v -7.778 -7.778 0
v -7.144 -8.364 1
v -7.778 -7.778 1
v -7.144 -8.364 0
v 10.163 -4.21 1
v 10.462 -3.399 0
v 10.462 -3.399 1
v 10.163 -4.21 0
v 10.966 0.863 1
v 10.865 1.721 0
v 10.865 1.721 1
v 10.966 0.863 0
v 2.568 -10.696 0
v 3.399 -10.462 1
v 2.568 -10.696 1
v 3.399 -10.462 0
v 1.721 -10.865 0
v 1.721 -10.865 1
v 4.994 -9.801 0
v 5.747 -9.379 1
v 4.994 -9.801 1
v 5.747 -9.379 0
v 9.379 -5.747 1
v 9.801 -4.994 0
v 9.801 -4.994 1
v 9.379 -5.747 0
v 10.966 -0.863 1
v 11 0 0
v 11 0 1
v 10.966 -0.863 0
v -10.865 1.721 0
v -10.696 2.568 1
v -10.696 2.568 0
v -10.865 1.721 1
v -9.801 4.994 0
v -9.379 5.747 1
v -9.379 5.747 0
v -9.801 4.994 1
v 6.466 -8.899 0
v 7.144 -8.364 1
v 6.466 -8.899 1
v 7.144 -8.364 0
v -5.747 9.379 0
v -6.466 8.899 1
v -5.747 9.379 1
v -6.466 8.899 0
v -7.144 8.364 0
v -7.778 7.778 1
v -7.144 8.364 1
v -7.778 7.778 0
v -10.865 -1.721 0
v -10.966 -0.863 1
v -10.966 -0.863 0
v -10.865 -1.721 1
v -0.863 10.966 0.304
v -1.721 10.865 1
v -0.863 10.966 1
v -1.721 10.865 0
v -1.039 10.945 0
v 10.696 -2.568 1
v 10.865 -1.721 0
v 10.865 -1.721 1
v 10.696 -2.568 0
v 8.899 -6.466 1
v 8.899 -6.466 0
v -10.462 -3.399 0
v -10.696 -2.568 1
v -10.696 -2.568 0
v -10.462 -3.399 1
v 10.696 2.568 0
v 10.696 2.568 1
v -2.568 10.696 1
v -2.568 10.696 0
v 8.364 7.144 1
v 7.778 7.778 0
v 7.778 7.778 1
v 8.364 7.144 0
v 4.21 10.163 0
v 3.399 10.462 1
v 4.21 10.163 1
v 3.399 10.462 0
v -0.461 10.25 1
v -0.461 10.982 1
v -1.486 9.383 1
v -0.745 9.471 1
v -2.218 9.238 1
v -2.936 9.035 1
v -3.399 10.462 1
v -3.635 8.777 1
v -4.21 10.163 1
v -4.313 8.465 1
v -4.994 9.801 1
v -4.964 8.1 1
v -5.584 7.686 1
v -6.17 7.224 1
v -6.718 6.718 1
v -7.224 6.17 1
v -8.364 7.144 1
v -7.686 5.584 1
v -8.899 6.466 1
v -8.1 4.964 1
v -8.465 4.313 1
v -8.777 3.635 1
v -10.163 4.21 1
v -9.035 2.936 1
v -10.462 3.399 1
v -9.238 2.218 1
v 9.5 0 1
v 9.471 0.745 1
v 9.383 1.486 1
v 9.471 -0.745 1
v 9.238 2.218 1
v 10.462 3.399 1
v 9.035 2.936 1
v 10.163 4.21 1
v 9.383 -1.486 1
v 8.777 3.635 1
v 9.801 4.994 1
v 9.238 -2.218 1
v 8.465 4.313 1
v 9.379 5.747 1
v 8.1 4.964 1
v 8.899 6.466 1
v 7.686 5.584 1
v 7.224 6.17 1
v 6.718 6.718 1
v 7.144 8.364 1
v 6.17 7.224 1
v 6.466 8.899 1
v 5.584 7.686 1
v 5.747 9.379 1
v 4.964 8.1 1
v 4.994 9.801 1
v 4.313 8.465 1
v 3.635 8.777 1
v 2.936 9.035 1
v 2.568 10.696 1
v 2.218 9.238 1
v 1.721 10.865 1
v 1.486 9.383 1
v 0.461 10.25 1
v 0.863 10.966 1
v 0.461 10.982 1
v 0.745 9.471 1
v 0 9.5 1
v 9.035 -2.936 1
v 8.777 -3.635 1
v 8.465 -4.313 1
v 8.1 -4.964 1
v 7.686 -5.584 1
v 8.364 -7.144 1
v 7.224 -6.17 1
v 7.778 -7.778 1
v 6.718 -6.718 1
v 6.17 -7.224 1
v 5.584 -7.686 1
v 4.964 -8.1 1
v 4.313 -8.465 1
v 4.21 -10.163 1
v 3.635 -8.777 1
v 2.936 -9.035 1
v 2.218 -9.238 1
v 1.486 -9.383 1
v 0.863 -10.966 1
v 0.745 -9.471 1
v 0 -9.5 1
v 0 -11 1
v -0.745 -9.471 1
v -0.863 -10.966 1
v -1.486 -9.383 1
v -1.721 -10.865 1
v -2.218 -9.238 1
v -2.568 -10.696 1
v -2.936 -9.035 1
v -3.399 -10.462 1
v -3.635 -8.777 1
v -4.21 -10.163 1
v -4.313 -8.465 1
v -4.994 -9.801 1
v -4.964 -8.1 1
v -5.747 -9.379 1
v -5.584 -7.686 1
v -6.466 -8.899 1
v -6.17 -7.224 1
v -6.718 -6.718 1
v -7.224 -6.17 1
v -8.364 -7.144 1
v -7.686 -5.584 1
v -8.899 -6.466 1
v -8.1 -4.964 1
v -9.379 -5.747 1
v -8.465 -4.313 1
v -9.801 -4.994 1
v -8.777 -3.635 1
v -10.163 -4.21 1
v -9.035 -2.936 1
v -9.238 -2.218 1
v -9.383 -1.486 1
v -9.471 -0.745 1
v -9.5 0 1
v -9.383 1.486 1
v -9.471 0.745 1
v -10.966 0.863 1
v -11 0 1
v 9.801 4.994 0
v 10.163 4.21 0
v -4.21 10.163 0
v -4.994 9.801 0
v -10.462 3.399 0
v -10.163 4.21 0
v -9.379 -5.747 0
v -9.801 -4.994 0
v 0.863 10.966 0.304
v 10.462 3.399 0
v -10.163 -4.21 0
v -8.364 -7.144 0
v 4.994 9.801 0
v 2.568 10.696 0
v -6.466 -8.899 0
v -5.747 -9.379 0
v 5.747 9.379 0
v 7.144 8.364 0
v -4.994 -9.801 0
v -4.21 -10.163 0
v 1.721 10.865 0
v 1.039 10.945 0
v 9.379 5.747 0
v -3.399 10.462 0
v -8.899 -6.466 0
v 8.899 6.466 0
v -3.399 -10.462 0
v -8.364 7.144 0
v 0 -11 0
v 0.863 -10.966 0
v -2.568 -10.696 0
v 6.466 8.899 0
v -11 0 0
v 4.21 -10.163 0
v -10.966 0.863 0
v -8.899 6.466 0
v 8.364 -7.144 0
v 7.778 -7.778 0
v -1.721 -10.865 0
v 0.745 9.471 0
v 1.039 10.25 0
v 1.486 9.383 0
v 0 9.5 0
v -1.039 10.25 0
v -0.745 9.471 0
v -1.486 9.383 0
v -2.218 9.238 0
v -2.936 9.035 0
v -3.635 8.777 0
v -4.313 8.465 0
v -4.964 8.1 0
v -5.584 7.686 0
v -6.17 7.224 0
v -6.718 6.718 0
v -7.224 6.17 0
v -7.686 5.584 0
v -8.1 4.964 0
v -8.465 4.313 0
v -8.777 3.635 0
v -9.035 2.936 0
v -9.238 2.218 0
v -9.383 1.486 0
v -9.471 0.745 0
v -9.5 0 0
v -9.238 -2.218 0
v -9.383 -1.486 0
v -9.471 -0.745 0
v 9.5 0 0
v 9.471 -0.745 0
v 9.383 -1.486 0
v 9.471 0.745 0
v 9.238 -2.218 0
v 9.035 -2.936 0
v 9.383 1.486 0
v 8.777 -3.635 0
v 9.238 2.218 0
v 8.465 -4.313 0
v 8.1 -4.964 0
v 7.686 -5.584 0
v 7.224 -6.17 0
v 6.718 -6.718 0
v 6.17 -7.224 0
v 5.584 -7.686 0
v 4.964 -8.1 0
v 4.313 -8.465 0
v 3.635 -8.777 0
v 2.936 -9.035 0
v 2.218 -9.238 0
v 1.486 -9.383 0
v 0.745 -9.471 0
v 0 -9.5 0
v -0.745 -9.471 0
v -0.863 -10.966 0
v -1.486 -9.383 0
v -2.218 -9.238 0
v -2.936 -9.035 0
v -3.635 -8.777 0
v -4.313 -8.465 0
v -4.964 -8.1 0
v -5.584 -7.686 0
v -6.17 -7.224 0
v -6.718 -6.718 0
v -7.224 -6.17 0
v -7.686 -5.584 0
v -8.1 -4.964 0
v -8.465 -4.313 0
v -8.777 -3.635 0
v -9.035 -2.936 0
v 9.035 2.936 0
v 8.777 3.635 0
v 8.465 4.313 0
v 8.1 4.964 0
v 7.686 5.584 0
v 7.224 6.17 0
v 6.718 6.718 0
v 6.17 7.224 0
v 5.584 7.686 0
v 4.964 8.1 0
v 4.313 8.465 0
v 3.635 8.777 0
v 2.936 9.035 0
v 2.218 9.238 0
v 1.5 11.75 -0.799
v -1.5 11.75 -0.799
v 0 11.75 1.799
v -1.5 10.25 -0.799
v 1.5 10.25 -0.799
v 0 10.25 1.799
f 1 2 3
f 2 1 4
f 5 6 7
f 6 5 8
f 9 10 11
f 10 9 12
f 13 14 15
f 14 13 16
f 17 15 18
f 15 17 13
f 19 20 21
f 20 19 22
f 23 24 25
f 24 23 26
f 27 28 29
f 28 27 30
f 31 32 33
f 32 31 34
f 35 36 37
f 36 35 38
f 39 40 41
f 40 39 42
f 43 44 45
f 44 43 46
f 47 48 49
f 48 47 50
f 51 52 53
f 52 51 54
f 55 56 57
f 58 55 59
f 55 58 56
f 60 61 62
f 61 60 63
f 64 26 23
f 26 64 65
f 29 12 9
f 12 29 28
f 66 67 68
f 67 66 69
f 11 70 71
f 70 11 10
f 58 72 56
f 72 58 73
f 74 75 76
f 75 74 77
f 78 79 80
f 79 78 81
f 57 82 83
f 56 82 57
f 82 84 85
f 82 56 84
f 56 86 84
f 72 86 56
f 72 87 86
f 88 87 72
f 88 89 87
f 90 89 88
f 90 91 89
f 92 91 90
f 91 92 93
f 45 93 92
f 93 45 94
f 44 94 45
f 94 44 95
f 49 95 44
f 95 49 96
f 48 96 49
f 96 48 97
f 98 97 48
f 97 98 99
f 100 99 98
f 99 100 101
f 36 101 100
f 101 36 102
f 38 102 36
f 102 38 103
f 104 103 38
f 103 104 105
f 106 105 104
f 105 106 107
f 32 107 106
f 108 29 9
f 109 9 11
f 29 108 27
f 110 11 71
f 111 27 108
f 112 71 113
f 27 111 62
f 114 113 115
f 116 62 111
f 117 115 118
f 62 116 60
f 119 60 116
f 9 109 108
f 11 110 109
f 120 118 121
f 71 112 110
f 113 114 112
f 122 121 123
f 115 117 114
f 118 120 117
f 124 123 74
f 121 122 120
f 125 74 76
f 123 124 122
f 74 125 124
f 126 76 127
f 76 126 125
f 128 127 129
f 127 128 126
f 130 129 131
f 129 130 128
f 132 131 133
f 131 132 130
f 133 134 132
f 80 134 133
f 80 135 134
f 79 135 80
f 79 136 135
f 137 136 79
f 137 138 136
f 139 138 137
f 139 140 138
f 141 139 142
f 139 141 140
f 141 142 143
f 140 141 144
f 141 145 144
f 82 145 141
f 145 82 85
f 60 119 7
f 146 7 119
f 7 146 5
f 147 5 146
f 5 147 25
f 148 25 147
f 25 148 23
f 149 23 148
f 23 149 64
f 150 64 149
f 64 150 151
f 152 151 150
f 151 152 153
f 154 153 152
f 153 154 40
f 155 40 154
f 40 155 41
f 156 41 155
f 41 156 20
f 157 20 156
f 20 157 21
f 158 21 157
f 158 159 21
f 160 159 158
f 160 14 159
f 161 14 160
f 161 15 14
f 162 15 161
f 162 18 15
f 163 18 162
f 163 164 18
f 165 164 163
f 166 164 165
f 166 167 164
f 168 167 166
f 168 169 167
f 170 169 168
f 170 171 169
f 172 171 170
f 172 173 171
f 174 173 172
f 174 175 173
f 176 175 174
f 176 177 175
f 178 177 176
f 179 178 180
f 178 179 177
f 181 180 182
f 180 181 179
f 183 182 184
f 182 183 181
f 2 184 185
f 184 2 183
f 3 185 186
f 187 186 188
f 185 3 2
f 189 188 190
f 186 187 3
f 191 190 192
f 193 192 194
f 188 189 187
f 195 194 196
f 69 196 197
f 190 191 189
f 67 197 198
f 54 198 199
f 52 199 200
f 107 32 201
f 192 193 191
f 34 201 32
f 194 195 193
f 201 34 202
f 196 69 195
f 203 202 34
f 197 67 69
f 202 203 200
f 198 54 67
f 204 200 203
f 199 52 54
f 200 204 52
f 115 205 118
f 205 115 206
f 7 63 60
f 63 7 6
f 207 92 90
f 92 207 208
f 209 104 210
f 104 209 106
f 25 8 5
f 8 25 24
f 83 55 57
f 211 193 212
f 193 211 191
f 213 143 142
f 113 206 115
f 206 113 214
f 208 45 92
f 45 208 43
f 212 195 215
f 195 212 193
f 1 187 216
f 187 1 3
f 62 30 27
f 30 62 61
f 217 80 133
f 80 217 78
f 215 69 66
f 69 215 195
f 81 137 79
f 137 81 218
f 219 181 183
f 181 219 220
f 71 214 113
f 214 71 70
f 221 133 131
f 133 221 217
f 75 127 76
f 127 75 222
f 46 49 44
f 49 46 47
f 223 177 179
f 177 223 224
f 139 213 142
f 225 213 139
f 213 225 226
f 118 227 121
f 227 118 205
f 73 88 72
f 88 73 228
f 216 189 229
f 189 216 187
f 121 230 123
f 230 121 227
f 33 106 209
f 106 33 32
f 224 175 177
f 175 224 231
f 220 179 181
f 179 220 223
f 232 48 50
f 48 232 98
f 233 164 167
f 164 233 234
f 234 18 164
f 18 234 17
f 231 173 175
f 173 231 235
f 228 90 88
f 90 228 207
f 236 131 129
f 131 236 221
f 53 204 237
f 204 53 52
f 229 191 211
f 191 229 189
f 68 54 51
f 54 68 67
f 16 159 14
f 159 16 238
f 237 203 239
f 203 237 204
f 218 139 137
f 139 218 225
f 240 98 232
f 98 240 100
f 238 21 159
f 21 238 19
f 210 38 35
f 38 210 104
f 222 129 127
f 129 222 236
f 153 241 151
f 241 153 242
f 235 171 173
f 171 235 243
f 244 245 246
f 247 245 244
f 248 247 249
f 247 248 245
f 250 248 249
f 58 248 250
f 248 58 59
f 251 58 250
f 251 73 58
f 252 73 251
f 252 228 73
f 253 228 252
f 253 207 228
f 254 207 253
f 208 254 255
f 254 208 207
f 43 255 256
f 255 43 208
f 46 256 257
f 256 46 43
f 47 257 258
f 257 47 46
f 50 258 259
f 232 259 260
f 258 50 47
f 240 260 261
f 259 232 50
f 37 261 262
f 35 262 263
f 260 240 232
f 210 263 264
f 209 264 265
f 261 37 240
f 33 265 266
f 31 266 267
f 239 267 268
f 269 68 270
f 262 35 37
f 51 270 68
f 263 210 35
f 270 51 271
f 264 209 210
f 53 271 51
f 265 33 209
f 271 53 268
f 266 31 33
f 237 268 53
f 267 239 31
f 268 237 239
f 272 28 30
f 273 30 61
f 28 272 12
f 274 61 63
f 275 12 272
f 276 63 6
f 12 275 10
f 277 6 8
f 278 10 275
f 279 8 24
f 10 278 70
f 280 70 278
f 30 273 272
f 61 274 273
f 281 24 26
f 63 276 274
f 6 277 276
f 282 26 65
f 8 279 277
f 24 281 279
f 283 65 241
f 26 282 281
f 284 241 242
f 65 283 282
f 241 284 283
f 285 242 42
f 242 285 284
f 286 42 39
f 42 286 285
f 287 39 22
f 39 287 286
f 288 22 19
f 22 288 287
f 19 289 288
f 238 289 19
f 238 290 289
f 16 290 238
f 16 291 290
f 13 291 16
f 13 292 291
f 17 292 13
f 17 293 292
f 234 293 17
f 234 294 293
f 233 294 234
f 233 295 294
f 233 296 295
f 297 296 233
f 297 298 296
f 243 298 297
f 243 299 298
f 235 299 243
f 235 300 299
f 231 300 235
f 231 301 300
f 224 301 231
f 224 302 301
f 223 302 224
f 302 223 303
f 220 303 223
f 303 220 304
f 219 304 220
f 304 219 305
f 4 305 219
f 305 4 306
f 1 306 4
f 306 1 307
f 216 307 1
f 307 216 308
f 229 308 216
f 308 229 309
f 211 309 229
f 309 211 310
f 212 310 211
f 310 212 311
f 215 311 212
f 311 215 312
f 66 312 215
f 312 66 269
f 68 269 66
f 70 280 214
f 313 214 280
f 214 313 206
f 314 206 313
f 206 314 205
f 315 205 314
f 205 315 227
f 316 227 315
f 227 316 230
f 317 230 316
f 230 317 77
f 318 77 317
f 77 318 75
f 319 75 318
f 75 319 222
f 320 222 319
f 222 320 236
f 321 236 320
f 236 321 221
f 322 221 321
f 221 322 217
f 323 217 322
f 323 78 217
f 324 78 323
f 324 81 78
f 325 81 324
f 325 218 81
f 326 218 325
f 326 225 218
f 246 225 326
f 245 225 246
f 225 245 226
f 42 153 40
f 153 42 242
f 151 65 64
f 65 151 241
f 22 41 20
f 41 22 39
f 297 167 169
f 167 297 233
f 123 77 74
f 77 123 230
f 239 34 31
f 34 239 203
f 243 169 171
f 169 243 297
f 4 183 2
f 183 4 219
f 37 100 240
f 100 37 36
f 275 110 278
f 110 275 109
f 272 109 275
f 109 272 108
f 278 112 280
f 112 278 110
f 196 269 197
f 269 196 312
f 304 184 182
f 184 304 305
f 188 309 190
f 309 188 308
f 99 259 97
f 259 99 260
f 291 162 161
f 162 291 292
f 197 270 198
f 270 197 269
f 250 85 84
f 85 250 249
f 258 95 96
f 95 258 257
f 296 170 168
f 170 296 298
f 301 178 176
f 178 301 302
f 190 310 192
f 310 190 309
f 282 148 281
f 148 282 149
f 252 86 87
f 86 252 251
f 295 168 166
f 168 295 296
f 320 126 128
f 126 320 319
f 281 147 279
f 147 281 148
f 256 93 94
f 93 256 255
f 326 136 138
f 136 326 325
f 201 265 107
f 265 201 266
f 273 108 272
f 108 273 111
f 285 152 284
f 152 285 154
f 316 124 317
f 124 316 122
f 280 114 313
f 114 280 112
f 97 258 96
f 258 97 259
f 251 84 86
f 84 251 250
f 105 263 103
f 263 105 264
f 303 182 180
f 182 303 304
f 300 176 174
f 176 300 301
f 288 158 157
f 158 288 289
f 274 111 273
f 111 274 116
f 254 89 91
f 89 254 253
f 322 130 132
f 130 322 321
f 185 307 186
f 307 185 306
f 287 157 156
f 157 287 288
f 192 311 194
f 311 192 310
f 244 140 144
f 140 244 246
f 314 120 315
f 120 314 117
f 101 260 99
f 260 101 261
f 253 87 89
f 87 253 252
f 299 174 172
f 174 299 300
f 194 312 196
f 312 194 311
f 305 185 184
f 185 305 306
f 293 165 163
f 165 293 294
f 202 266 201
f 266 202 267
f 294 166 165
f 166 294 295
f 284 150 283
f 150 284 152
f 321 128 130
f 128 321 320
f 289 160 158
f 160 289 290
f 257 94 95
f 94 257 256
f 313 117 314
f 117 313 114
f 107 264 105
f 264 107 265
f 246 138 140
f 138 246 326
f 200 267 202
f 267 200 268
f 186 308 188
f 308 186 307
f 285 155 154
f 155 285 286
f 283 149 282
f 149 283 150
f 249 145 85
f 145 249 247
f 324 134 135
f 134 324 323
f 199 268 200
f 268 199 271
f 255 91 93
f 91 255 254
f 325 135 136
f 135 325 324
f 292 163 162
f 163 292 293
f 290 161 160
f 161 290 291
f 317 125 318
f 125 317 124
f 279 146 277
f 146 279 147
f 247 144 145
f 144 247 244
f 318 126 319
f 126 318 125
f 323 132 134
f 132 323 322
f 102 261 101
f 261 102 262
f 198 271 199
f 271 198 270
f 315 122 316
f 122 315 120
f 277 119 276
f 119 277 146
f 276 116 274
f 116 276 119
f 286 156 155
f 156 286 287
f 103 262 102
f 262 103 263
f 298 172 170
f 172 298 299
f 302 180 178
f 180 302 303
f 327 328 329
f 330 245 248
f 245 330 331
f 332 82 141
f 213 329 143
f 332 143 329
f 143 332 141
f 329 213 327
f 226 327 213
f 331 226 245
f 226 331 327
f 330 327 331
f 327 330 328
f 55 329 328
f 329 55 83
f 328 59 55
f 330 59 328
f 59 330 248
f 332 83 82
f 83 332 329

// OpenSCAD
// Triangle Accent Ring (IMG_1014)
// A delicate ring with a small triangular accent on top

// Parameters
ring_diameter = 19;      // Inner diameter of ring (adjust for finger size)
band_thickness = 1.5;    // Thickness of the thin band
band_height = 1;       // Height of the band
triangle_size = 3;       // Size of the triangle accent

$fn = 80;

module triangle_accent_ring() {
    union() {
        // Main thin band
        difference() {
            cylinder(h=band_height, d=ring_diameter + 2*band_thickness);
            translate([0, 0, -0.5])
                cylinder(h=band_height + 1, d=ring_diameter);
        }

        // Triangle accent on outside of ring
        translate([0, ring_diameter/2 + band_thickness, band_height/2]) {
            rotate([90, 0, 0]) {
                linear_extrude(height=1.5, center=true) {
                    polygon([
                        [0, triangle_size * 0.866 / 2],
                        [-triangle_size/2, -triangle_size * 0.866 / 2],
                        [triangle_size/2, -triangle_size * 0.866 / 2]
                    ]);
                }
            }
        }
    }
}

triangle_accent_ring();
